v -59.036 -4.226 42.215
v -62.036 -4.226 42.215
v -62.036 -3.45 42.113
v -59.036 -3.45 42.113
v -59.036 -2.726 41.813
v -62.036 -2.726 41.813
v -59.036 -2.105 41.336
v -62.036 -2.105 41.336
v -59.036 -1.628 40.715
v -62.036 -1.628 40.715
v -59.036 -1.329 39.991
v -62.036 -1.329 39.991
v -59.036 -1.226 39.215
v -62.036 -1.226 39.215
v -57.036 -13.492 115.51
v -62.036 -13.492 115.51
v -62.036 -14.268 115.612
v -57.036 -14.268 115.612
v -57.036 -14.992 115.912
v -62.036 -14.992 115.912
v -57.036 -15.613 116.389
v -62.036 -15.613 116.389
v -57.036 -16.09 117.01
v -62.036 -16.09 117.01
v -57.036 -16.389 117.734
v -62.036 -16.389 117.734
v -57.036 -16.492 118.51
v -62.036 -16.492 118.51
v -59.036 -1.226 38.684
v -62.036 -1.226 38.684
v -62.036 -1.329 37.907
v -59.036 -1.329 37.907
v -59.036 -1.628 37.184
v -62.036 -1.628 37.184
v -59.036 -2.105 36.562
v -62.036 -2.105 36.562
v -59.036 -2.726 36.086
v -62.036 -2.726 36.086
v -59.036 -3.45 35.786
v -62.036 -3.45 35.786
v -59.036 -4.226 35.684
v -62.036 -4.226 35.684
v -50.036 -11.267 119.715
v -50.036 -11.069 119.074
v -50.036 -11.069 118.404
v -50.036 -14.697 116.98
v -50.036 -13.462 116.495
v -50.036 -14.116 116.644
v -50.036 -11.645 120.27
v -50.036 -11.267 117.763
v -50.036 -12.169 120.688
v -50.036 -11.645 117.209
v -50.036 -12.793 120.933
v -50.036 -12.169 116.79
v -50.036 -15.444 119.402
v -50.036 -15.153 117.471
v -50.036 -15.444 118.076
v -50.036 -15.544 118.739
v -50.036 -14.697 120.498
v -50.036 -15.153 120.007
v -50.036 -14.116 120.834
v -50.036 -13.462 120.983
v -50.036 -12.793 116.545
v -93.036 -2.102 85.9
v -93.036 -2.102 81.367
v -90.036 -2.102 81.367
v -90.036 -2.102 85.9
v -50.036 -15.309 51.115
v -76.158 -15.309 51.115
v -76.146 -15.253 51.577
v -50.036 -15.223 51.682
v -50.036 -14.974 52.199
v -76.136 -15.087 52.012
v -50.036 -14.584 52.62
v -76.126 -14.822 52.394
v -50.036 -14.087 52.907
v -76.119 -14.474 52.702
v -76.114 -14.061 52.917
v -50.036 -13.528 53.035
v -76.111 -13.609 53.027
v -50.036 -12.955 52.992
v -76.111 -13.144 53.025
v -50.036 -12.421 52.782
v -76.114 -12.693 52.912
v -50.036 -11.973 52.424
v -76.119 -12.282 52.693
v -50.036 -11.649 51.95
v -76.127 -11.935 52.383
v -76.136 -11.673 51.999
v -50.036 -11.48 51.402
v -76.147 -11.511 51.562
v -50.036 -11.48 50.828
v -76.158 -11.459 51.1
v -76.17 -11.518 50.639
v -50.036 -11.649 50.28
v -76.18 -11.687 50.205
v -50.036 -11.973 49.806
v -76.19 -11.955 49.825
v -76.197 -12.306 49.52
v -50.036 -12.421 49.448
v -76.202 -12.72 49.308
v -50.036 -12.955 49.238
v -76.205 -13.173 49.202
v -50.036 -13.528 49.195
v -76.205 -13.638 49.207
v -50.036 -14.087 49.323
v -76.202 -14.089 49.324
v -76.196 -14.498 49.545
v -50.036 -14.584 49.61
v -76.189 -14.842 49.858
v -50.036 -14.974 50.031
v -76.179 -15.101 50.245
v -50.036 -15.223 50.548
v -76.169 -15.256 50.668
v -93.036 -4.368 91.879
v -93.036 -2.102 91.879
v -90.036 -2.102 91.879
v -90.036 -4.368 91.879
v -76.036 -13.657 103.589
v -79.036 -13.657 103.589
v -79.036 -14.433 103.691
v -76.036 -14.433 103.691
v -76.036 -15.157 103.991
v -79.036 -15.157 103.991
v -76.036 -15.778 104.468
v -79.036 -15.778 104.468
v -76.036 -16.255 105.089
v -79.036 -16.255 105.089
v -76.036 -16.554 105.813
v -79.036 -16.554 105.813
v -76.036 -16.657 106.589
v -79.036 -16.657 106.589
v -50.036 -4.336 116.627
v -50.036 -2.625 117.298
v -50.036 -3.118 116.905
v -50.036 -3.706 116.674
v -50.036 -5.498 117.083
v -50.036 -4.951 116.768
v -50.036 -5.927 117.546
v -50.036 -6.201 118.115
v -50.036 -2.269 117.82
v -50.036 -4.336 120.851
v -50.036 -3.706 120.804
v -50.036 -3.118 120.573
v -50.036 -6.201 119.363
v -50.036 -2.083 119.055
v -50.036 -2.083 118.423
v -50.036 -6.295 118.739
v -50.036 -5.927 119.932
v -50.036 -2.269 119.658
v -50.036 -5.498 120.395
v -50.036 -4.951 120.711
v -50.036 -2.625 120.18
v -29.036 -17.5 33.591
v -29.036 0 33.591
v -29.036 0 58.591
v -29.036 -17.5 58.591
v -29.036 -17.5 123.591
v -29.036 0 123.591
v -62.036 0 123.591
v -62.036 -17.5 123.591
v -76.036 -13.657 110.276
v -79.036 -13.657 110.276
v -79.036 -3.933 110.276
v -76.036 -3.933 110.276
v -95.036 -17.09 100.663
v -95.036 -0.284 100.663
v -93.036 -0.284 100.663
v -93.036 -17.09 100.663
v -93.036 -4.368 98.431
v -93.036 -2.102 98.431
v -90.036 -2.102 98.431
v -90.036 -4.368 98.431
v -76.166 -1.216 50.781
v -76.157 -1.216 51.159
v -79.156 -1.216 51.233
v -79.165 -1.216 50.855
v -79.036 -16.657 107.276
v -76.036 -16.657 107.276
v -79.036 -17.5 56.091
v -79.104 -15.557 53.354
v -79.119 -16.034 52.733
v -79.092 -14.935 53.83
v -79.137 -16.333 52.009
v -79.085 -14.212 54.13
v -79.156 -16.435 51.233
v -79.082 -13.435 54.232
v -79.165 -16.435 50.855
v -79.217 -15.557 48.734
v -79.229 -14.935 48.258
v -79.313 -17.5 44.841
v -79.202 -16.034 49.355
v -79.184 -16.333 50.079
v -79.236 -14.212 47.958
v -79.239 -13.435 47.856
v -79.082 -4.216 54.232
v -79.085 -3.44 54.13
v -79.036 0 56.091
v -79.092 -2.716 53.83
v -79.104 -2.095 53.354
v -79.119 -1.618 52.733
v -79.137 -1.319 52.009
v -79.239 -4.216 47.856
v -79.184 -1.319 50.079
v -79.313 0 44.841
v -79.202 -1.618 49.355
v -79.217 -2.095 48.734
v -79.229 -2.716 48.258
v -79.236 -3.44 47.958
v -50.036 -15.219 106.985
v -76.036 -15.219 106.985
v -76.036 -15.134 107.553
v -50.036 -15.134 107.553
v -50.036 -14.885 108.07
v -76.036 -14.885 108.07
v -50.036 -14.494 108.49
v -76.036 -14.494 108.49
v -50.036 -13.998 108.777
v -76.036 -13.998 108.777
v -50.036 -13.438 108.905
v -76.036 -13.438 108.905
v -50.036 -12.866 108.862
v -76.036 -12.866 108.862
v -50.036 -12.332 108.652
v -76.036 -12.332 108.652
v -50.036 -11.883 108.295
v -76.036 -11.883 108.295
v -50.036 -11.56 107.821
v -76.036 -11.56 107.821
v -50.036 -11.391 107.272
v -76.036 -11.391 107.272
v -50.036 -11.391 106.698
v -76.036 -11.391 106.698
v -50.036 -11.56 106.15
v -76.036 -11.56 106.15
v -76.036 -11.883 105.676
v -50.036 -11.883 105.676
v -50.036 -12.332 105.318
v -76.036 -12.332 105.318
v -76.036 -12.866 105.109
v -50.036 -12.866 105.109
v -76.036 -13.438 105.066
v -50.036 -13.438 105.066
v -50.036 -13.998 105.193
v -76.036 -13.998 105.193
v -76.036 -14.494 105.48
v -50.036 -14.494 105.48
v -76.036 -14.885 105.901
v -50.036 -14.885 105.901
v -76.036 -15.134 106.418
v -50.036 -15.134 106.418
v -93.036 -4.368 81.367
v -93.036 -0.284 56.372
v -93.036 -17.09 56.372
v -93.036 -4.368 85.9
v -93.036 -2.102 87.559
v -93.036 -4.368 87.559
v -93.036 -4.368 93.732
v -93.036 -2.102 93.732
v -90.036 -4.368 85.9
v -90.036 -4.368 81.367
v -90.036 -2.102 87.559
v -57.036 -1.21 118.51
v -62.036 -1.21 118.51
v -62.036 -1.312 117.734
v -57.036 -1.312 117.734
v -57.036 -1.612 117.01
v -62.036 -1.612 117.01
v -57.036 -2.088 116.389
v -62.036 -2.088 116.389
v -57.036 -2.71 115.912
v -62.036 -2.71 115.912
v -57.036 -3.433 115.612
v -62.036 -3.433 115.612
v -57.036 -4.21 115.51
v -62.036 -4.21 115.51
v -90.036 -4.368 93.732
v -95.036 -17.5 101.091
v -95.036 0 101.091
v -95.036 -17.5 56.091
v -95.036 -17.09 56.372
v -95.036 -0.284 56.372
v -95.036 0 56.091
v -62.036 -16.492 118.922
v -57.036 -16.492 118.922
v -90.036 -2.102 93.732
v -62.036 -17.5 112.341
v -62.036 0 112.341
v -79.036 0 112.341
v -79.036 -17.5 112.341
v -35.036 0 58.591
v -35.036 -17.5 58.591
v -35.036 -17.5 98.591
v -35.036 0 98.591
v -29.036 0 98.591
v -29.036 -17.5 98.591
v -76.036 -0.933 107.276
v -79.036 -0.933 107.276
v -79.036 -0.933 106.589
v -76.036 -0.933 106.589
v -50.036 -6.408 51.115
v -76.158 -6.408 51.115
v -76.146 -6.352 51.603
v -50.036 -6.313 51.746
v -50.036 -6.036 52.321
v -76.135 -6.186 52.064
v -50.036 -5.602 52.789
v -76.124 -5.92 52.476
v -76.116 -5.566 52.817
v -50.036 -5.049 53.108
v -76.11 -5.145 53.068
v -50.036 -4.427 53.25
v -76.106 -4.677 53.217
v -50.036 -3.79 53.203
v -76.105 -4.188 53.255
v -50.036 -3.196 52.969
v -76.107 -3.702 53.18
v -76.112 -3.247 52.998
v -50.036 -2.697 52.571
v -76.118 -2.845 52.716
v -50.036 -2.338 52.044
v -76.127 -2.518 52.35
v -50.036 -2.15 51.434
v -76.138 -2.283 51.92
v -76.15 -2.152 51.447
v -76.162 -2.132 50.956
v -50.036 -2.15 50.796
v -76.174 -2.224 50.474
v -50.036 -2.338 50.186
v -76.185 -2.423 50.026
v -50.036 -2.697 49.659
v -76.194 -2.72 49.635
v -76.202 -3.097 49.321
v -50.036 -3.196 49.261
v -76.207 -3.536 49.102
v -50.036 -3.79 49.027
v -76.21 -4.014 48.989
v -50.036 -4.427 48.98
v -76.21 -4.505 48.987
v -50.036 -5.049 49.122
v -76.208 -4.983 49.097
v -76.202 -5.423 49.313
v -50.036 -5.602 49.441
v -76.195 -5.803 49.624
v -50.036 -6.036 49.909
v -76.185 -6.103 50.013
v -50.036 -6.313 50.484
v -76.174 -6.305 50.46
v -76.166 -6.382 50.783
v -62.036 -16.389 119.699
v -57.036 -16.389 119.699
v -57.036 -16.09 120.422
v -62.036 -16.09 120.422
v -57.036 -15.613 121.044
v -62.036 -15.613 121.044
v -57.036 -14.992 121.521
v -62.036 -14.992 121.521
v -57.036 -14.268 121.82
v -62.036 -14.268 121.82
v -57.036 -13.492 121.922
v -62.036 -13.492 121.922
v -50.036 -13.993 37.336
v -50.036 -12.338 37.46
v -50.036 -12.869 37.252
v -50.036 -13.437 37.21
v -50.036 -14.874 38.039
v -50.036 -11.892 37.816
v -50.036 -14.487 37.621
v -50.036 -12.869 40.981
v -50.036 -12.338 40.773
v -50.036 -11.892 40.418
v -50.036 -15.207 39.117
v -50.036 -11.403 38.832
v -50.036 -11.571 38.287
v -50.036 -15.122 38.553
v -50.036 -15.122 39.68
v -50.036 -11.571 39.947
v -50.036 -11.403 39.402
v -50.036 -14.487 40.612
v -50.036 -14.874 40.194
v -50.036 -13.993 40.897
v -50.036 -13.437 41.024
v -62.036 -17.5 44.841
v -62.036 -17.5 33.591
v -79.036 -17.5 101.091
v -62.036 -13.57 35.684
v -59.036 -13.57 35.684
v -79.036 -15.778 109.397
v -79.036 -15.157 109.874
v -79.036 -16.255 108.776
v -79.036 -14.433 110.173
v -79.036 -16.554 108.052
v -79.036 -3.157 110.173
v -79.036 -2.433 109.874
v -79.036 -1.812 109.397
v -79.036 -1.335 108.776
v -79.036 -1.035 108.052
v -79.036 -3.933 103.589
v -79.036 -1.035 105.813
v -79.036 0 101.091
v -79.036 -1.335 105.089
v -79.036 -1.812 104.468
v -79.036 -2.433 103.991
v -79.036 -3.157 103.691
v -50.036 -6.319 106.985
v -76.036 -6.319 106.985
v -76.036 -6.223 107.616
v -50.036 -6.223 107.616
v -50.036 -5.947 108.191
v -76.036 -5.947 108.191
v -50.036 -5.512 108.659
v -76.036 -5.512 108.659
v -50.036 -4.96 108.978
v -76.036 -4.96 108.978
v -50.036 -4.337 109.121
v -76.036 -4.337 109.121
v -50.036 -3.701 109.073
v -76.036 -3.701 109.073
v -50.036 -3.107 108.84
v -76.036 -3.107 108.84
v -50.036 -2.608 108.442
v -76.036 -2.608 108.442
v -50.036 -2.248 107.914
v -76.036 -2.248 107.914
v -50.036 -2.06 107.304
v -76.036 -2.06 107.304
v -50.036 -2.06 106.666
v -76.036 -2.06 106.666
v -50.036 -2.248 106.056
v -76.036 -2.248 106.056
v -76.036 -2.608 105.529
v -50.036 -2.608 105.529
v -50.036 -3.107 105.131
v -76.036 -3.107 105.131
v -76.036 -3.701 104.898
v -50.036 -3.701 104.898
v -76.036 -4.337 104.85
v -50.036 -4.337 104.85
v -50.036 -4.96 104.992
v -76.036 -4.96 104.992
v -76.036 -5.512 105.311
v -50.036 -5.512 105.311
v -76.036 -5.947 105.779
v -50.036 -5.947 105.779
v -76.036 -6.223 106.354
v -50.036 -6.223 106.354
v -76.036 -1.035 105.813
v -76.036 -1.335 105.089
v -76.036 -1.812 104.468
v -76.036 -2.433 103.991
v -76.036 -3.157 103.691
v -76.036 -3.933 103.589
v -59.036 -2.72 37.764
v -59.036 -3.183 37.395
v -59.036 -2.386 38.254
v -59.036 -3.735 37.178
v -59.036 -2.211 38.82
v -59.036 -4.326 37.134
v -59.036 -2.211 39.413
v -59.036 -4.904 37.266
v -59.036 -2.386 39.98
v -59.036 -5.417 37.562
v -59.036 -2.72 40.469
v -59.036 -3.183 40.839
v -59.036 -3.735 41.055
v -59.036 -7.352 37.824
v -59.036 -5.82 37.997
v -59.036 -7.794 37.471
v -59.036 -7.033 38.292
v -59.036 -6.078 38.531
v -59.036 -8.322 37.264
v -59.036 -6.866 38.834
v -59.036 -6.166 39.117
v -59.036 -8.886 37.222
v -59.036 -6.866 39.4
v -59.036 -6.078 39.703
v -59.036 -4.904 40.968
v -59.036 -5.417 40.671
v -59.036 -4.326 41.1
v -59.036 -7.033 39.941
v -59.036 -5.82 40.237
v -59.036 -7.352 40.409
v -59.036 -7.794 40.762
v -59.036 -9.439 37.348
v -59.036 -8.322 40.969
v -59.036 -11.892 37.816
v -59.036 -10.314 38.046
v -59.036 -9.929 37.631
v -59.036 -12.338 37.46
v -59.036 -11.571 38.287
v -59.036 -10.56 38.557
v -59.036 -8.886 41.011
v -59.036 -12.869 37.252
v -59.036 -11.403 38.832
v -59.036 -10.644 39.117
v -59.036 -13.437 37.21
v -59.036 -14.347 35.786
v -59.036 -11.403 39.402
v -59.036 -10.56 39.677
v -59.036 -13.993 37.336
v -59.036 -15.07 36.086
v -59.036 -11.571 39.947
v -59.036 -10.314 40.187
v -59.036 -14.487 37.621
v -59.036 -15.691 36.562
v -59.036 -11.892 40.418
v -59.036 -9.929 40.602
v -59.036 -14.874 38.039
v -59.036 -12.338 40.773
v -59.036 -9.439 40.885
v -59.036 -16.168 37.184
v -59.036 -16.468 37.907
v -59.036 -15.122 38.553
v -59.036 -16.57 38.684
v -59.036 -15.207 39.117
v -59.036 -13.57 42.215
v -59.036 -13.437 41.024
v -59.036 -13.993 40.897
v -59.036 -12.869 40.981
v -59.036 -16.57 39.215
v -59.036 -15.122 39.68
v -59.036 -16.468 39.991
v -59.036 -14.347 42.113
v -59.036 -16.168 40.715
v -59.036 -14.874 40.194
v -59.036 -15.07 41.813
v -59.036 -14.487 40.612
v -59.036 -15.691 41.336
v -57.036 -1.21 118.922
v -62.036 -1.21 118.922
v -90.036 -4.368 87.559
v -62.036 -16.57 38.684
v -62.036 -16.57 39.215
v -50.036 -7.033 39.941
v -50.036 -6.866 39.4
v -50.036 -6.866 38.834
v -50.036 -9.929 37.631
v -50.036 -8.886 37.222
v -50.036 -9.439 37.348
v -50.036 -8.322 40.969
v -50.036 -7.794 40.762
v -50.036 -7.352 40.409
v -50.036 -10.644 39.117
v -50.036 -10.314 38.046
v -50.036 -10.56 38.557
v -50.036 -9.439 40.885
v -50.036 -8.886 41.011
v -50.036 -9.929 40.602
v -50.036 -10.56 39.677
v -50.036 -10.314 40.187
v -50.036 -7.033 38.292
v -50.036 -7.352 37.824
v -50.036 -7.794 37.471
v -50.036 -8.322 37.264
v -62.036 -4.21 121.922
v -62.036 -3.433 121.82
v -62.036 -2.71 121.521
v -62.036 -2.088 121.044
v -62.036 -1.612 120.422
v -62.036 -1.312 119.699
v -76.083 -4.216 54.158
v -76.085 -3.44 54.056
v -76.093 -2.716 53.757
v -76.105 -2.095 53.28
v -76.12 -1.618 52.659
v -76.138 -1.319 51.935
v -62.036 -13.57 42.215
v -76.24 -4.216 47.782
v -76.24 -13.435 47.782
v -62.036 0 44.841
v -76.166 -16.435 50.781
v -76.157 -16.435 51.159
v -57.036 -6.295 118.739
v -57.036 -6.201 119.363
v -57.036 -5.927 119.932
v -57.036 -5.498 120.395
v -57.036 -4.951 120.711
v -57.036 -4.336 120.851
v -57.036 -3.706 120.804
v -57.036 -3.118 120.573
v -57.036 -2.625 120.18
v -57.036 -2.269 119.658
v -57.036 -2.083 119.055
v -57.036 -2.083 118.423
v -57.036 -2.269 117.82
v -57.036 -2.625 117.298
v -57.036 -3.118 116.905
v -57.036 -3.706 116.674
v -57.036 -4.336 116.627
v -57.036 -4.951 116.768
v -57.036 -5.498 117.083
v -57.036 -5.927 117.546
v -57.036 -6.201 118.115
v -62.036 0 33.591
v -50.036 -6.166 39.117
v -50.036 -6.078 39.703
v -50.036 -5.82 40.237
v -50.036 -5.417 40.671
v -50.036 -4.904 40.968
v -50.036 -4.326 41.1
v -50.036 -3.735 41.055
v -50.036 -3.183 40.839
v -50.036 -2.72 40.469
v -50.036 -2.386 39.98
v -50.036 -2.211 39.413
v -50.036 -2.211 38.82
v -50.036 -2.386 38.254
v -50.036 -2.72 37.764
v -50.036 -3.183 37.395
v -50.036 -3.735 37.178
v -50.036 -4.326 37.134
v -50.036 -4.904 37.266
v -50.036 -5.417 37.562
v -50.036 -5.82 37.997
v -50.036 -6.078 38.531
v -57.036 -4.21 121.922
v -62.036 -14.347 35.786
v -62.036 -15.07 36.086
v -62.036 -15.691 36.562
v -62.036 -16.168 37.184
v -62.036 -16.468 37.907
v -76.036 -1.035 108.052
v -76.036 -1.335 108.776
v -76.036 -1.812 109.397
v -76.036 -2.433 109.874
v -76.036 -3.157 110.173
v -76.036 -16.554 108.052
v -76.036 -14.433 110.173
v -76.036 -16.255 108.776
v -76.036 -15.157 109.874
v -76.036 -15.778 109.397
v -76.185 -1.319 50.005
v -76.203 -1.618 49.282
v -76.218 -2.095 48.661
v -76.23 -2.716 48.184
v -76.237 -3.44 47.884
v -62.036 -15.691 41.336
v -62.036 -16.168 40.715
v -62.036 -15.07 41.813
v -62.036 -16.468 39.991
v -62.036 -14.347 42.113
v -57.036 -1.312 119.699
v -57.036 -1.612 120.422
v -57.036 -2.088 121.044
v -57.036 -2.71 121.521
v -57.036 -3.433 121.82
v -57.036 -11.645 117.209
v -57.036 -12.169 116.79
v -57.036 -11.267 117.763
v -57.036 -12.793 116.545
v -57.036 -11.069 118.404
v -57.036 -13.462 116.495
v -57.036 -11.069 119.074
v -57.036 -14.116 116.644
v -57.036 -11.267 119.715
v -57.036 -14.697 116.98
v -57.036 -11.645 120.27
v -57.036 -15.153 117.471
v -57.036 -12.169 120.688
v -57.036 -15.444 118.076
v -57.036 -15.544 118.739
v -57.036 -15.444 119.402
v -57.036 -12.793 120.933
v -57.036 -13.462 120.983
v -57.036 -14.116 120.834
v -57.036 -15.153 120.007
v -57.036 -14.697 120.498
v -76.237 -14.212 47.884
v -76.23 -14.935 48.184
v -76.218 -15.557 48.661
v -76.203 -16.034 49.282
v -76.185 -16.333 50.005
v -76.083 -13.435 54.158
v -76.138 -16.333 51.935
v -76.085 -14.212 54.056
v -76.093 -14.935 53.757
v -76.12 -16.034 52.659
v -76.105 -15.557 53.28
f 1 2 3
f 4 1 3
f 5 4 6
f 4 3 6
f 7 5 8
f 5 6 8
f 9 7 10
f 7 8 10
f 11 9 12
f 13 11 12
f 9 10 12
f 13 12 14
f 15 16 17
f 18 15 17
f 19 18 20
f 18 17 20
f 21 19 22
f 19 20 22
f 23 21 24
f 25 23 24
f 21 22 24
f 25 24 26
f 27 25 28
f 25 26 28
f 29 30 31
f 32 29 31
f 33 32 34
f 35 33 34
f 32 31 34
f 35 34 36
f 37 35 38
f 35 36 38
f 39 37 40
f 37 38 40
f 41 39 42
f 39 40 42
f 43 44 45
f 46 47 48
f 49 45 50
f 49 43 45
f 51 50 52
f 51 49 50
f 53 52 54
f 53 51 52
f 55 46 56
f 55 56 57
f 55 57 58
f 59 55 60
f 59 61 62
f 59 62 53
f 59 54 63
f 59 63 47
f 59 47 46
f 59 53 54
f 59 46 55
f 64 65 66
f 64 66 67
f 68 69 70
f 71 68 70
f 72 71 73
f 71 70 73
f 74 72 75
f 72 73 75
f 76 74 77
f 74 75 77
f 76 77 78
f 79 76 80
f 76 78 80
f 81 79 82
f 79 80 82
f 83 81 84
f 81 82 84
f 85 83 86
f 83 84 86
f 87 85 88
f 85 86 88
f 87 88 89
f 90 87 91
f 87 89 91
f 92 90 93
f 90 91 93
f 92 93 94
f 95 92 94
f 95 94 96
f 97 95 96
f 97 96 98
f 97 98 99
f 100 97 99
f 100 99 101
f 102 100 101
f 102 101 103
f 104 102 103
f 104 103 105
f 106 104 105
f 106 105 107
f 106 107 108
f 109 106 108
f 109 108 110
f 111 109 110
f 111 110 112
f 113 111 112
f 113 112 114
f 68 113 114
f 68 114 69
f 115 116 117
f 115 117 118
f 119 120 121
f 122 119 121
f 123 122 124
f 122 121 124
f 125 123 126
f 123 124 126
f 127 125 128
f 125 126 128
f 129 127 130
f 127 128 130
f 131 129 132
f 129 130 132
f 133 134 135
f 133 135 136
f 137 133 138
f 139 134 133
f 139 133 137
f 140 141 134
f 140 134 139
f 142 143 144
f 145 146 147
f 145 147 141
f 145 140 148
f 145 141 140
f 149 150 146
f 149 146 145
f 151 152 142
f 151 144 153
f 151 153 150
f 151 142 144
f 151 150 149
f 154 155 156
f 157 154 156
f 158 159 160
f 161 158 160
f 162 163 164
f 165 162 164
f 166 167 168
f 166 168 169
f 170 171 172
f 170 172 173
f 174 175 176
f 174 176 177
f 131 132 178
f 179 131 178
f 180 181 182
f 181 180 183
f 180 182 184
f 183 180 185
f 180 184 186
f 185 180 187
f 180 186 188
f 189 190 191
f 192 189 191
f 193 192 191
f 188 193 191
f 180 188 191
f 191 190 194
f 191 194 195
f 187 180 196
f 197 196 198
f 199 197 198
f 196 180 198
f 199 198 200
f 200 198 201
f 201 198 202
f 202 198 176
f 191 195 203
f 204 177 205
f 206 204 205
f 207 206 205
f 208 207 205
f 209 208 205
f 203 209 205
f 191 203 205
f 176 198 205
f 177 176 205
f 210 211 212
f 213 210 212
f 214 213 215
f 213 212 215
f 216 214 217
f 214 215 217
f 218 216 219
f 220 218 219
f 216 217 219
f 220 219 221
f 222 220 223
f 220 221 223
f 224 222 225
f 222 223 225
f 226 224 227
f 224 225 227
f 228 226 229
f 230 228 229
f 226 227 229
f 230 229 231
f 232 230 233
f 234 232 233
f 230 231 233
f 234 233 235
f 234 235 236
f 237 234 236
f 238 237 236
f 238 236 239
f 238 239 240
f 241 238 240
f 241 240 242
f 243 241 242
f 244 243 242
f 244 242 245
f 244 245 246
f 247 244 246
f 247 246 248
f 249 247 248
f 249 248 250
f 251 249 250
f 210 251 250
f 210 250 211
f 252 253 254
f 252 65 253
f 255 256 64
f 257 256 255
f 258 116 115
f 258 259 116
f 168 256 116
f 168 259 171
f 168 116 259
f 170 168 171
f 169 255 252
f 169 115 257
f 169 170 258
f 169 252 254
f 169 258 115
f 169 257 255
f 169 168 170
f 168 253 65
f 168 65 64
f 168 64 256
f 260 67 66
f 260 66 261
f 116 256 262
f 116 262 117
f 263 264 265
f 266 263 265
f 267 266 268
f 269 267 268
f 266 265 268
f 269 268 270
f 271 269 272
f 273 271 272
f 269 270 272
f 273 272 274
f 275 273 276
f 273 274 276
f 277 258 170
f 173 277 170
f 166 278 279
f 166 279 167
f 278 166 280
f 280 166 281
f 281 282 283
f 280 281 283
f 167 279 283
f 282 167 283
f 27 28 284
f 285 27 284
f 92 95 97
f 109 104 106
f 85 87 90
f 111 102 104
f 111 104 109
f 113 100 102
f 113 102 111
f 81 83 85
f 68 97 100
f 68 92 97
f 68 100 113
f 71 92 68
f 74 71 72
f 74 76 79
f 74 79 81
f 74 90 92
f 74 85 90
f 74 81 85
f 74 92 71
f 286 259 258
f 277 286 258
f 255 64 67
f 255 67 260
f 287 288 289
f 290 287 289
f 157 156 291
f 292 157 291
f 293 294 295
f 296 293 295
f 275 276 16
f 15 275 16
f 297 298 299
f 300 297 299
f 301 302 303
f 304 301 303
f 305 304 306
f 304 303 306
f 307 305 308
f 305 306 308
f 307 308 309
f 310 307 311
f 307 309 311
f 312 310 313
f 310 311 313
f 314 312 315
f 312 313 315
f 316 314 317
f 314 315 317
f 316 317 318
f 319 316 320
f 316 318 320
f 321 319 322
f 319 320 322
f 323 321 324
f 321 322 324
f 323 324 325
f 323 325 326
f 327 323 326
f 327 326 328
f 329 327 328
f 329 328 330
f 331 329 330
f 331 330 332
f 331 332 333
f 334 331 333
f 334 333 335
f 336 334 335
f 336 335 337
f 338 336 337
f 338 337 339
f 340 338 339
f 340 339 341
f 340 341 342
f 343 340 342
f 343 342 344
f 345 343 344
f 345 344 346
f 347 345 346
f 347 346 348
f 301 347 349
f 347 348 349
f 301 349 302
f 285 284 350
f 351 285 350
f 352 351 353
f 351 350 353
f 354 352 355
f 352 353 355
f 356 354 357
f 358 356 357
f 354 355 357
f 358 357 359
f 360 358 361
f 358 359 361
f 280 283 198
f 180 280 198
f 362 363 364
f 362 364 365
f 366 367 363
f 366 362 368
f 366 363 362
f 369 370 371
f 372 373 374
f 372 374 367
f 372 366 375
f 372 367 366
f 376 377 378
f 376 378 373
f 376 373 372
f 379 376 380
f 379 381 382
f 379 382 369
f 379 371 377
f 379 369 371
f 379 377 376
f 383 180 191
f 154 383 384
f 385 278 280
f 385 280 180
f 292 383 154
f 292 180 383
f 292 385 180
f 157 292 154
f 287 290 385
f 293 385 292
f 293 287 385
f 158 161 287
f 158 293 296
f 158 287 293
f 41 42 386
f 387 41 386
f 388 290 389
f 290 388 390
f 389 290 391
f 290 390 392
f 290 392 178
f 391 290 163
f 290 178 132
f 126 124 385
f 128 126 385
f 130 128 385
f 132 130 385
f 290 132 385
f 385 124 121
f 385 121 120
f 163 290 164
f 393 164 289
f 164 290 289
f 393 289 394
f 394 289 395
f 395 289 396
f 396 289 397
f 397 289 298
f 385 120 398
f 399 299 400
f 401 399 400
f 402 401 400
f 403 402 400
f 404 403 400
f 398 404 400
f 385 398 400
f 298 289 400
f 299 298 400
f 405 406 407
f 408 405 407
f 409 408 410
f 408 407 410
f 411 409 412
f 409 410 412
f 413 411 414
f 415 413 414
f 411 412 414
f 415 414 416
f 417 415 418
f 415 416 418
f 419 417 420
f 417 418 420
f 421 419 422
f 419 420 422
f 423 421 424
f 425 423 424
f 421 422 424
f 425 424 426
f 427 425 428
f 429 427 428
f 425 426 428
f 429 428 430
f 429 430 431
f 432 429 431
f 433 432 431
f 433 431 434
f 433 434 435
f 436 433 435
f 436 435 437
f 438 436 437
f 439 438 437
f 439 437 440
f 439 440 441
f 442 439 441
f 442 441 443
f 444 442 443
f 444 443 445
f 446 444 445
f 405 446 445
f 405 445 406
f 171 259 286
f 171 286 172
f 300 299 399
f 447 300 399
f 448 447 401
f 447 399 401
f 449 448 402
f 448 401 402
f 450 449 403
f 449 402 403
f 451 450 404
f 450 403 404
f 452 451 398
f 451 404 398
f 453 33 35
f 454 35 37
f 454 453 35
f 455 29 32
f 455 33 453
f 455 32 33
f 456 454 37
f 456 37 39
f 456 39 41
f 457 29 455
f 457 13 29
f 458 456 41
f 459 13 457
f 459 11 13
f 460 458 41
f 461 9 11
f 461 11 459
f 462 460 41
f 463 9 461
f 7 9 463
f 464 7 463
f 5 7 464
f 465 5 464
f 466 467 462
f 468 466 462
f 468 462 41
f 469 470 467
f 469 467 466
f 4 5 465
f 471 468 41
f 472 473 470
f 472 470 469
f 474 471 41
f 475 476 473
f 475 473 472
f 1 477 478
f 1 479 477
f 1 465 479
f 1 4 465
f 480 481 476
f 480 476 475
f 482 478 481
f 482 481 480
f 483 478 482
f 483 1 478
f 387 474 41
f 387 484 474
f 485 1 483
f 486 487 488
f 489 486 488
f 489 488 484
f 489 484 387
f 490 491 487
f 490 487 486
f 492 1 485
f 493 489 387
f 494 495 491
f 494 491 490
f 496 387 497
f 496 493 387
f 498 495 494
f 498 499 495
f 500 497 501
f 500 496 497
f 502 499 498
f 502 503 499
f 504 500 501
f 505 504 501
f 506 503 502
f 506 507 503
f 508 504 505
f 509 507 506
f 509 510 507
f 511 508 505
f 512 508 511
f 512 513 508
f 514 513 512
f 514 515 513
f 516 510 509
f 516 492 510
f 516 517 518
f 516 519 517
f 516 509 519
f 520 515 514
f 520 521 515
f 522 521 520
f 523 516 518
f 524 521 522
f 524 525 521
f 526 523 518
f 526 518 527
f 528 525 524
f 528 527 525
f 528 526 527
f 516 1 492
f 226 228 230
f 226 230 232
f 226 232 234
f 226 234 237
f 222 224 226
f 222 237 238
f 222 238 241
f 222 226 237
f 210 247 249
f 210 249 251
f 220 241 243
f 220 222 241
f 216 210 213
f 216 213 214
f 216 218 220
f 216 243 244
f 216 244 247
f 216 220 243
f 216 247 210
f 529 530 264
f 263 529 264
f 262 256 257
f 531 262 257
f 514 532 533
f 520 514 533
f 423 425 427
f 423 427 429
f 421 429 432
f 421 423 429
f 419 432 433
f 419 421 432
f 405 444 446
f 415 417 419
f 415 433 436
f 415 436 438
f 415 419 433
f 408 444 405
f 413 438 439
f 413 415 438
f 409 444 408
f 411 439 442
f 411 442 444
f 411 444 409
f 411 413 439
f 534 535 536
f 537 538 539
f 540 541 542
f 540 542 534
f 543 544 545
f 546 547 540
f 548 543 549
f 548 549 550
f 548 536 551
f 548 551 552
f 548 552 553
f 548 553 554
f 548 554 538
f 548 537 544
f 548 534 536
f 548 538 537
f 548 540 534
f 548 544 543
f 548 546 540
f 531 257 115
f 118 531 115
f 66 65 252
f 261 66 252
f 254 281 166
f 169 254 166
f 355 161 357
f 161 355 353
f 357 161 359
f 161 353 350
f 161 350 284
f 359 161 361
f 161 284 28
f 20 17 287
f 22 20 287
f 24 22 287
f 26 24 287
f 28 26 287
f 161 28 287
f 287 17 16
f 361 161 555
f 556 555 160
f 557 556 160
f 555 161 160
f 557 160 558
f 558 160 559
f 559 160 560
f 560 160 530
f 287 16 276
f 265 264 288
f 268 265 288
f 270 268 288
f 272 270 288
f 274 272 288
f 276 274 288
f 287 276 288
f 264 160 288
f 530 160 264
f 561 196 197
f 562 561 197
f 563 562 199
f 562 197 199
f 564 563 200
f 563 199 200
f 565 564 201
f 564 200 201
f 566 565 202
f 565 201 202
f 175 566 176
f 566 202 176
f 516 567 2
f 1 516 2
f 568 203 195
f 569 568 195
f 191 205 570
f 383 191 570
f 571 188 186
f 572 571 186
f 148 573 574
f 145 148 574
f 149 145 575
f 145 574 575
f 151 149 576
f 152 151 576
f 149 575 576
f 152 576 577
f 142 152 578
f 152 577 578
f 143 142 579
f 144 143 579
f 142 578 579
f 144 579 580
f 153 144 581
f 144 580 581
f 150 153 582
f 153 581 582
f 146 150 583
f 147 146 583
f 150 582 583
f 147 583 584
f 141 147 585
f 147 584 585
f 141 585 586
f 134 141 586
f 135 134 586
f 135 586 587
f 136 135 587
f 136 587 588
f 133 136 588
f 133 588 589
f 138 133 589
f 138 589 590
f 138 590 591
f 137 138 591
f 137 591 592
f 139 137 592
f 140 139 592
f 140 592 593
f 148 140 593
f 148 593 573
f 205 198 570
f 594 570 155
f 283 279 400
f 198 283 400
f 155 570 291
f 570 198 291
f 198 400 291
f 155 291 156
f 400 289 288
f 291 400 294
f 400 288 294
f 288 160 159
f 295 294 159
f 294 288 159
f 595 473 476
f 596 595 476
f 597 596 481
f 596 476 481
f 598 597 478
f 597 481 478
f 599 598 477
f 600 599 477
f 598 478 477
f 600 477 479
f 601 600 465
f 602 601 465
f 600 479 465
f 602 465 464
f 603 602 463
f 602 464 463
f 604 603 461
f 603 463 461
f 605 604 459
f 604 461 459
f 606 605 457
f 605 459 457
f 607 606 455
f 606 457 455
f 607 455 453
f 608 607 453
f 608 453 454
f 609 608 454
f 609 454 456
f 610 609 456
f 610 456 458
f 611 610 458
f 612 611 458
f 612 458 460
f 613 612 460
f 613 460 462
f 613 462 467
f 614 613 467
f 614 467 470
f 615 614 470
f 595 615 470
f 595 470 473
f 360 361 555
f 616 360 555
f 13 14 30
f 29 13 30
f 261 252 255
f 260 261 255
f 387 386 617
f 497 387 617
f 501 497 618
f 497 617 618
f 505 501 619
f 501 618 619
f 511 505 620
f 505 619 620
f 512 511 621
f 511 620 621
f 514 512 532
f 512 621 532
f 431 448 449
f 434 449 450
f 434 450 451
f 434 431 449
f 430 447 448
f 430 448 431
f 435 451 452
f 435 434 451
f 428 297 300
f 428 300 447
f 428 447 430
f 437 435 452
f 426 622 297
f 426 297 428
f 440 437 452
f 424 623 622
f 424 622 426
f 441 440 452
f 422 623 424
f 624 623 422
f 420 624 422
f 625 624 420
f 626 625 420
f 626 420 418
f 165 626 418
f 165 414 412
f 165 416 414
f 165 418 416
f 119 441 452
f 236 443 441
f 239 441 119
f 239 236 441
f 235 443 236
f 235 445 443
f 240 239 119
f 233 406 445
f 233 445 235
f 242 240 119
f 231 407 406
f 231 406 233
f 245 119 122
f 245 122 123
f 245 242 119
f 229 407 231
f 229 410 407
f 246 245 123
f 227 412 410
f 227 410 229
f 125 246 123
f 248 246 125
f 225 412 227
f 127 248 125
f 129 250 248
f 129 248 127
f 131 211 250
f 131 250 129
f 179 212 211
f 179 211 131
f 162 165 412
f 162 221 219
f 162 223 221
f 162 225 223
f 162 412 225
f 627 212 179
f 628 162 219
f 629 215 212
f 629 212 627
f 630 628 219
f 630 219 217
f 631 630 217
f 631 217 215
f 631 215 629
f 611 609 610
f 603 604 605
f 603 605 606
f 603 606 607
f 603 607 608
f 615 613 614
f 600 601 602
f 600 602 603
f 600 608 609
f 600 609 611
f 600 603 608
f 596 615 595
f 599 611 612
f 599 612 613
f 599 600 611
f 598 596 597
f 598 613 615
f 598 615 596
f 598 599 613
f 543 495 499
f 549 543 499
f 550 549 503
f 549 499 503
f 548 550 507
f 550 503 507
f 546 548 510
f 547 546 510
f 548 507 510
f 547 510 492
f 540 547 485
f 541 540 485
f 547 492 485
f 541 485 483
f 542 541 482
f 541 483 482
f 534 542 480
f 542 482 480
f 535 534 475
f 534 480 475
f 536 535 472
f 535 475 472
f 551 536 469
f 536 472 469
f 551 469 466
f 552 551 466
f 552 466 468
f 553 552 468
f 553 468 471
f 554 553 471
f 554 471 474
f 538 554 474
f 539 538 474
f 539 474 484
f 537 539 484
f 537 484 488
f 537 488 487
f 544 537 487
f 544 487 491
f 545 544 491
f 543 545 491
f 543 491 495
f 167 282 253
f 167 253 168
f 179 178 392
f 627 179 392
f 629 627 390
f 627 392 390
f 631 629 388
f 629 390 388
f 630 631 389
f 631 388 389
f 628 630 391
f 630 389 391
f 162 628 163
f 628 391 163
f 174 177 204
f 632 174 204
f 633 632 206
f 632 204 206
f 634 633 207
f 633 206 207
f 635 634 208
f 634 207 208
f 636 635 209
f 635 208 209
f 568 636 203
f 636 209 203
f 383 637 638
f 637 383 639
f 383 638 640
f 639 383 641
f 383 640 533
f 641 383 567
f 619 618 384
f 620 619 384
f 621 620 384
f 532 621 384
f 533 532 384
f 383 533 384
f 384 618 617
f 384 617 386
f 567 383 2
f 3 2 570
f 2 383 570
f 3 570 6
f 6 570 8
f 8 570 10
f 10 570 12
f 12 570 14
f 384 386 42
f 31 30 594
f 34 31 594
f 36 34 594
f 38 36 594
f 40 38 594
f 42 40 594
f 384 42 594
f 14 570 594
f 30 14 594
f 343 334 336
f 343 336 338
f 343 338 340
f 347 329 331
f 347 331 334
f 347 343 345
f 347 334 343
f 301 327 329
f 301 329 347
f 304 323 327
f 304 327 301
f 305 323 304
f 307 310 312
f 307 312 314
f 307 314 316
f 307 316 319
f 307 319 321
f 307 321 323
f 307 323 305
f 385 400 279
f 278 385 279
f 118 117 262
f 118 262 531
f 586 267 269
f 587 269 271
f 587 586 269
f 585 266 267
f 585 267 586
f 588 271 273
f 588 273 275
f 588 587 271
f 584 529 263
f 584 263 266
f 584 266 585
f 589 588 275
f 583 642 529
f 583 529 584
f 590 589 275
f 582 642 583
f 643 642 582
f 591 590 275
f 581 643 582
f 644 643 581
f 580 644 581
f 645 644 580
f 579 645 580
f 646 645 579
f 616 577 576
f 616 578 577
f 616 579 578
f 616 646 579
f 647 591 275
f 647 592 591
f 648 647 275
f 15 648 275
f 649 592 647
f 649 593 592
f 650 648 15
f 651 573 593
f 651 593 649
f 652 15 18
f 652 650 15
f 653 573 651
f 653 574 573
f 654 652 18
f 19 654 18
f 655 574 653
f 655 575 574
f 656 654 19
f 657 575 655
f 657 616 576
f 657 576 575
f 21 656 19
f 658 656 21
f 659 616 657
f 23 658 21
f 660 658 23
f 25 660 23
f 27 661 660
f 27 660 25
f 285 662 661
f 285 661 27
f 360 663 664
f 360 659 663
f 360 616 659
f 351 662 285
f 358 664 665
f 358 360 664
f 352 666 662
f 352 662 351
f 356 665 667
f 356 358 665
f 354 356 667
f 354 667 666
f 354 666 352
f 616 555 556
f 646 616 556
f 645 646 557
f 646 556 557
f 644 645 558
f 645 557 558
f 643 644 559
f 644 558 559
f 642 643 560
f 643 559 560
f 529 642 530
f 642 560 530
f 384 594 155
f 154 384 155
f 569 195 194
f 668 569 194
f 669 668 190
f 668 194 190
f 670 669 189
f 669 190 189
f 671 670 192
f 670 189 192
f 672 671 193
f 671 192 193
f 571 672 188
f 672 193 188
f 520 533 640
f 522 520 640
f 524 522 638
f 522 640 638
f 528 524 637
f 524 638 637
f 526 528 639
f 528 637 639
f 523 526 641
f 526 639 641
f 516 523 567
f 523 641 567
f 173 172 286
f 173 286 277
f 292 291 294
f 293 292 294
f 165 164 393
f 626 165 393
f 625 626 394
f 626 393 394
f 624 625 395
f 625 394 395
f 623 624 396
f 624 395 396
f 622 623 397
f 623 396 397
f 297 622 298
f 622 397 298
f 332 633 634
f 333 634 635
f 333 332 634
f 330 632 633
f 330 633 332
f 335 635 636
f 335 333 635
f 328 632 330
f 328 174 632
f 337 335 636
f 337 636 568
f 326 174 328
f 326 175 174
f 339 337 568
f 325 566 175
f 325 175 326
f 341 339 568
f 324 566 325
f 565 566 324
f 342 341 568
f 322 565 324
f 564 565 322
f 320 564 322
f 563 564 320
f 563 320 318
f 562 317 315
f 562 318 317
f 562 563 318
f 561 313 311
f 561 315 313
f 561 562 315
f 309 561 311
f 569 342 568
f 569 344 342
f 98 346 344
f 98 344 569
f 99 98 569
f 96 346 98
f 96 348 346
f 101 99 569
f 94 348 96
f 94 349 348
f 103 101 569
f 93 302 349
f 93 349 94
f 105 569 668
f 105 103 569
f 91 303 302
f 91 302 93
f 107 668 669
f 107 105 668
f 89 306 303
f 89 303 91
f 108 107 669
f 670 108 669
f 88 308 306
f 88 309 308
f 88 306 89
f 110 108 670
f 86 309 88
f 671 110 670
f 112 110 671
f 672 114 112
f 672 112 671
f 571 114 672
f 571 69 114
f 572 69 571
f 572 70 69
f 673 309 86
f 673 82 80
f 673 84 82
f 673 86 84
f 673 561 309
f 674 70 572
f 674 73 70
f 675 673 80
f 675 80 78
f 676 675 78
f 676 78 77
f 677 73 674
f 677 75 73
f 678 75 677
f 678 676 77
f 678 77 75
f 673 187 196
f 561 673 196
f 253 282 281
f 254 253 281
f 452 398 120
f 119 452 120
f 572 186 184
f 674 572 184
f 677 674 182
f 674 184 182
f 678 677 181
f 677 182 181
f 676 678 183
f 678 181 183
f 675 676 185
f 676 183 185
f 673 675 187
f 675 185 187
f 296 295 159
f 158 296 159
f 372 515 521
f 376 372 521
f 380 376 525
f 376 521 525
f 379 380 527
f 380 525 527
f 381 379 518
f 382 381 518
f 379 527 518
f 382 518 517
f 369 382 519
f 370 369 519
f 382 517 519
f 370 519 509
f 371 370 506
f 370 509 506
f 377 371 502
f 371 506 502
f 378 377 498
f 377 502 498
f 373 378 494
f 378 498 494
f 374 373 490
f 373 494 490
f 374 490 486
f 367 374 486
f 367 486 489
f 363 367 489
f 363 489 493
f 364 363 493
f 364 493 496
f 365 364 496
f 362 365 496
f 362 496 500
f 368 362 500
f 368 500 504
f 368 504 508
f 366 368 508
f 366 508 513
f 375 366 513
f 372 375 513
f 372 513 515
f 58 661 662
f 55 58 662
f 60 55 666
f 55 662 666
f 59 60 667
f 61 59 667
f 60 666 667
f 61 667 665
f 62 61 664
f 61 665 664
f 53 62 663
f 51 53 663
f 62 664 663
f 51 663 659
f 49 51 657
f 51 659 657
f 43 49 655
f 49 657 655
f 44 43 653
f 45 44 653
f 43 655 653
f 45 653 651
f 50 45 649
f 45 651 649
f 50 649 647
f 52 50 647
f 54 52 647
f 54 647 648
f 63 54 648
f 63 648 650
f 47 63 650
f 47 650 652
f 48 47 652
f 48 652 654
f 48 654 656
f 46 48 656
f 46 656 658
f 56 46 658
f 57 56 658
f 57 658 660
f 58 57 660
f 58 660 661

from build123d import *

# Parameters (mm, degrees)
F1_DEPTH  = 17.5
F4_DEPTH  = 5
F6_DEPTH  = 3
F8_DEPTH  = 3
F9_W      = 16.8058317795
F9_H      = 44.2914962769
F10_DEPTH = 2
F2_R      = 2.117891982
F2_R_2    = 2.2502095604
F2_R_3    = 2.1412189154
F2_R_4    = 1.9250274961
F2_R_5    = 1.9886102938
F2_R_6    = 1.8999785502
F2_R_7    = 1.9125474789
F11_DEPTH = 45
F13_DEPTH = 3
F14_W     = 2.2663704585
F14_H     = 4.6991482377
F14_H_2   = 4.3204948306
F14_H_3   = 4.5327991247
F15_DEPTH = 3


with BuildPart() as f1:
    # F0 (on Front) → F1 (new body)
    with BuildSketch(Plane.XZ):
        Polygon((-29.036315158, 123.5913918912), (-62.036315158, 123.5913918912), (-62.036315158, 112.3413918912), (-79.036315158, 112.3413918912), (-79.036315158, 101.0913918912), (-95.036315158, 101.0913918912), (-95.036315158, 56.0913918912), (-79.036315158, 56.0913918912), (-79.3131489307, 44.8413918912), (-62.036315158, 44.8413918912), (-62.036315158, 33.5913918912), (-29.036315158, 33.5913918912), (-29.036315158, 58.5913918912), (-35.036315158, 58.5913918912), (-35.036315158, 98.5913918912), (-29.036315158, 98.5913918912), align=None)
    extrude(amount=F1_DEPTH)

    # F3 (on face) → F4 (cut)
    with BuildSketch(Plane(origin=(-62.036315158, 0, 0), x_dir=(0, -1, 0), z_dir=(-1, 0, 0))):
        with BuildLine():
            Line((13.4917167276, 121.9224523306), (4.209778944, 121.9224523306))
            ThreePointArc((4.209778944, 121.9224523306), (2.0884586005, 121.0437726741), (1.209778944, 118.9224523306))
            Line((1.209778944, 118.9224523306), (1.209778944, 118.5100823641))
            ThreePointArc((1.209778944, 118.5100823641), (2.0884586005, 116.3887620205), (4.209778944, 115.5100823641))
            Line((4.209778944, 115.5100823641), (13.4917167276, 115.5100823641))
            ThreePointArc((13.4917167276, 115.5100823641), (15.6130370712, 116.3887620205), (16.4917167276, 118.5100823641))
            Line((16.4917167276, 118.5100823641), (16.4917167276, 118.9224523306))
            ThreePointArc((16.4917167276, 118.9224523306), (15.6130370712, 121.0437726741), (13.4917167276, 121.9224523306))
        make_face()
    extrude(amount=-F4_DEPTH, mode=Mode.SUBTRACT)

    # F5 (on face) → F6 (cut)
    with BuildSketch(Plane(origin=(-79.036315158, 0, 0), x_dir=(0, -1, 0), z_dir=(-1, 0, 0))):
        with BuildLine():
            Line((13.656557098, 110.2756986618), (3.9331587353, 110.2756986618))
            ThreePointArc((3.9331587353, 110.2756986618), (1.8118383917, 109.3970190054), (0.9331587353, 107.2756986618))
            Line((0.9331587353, 107.2756986618), (0.9331587353, 106.5890877247))
            ThreePointArc((0.9331587353, 106.5890877247), (1.8118383917, 104.4677673811), (3.9331587353, 103.5890877247))
            Line((3.9331587353, 103.5890877247), (13.656557098, 103.5890877247))
            ThreePointArc((13.656557098, 103.5890877247), (15.7778774416, 104.4677673811), (16.656557098, 106.5890877247))
            Line((16.656557098, 106.5890877247), (16.656557098, 107.2756986618))
            ThreePointArc((16.656557098, 107.2756986618), (15.7778774416, 109.3970190054), (13.656557098, 110.2756986618))
        make_face()
    extrude(amount=-F6_DEPTH, mode=Mode.SUBTRACT)

    # F7 (on face) → F8 (cut)
    with BuildSketch(Plane(origin=(-62.036315158, 0, 0), x_dir=(0, -1, 0), z_dir=(-1, 0, 0))):
        with BuildLine():
            ThreePointArc((1.2264838442, 38.6837883592), (2.1051635007, 36.5624680156), (4.2264838442, 35.6837883592))
            Line((4.2264838442, 35.6837883592), (13.5701508522, 35.6837883592))
            ThreePointArc((13.5701508522, 35.6837883592), (15.6914711958, 36.5624680156), (16.5701508522, 38.6837883592))
            Line((16.5701508522, 38.6837883592), (16.5701508522, 39.2147824168))
            ThreePointArc((16.5701508522, 39.2147824168), (15.6914711958, 41.3361027604), (13.5701508522, 42.2147824168))
            Line((13.5701508522, 42.2147824168), (4.2264838442, 42.2147824168))
            ThreePointArc((4.2264838442, 42.2147824168), (2.1051635007, 41.3361027604), (1.2264838442, 39.2147824168))
            Line((1.2264838442, 39.2147824168), (1.2264838442, 38.6837883592))
        make_face()
    extrude(amount=-F8_DEPTH, mode=Mode.SUBTRACT)

    # F9 (on face) → F10 (cut)
    with BuildSketch(Plane(origin=(-95.036315158, 0, 0), x_dir=(0, -1, 0), z_dir=(-1, 0, 0))):
        with Locations((8.6868142389, 78.5176903009)):
            Rectangle(F9_W, F9_H)
    extrude(amount=-F10_DEPTH, mode=Mode.SUBTRACT)

    # F2 (on face) → F11 (cut)
    with BuildSketch(Plane(origin=(-95.036315158, 0, 0), x_dir=(0, -1, 0), z_dir=(-1, 0, 0))):
        with Locations((4.1773817502, 118.7390312552)):
            Circle(F2_R)
        with Locations((13.2942087948, 118.7390312552)):
            Circle(F2_R_2)
        with Locations((4.1773817502, 106.985270977)):
            Circle(F2_R_3)
        with Locations((13.2942087948, 106.985270977)):
            Circle(F2_R_4)
        with Locations((4.2668927927, 51.1149987578)):
            Circle(F2_R_3)
        with Locations((13.3837198373, 51.1149987578)):
            Circle(F2_R_4)
        with Locations((4.1773817502, 39.1167402267)):
            Circle(F2_R_5)
        with Locations((8.744363673, 39.1167402267)):
            Circle(F2_R_6)
        with Locations((13.2942087948, 39.1167402267)):
            Circle(F2_R_7)
    extrude(amount=-F11_DEPTH, mode=Mode.SUBTRACT)

    # F12 (on face) → F13 (cut)
    with BuildSketch(Plane(origin=(-80.3679161841, 0, 1.9776491945), x_dir=(0, -1, 0), z_dir=(-0.9996973742, 0, 0.0245999996))):
        with BuildLine():
            ThreePointArc((16.4354741573, 49.2703006864), (15.5567945009, 51.3916210299), (13.4354741573, 52.2703006864))
            Line((13.4354741573, 52.2703006864), (4.2163297506, 52.2703006864))
            ThreePointArc((4.2163297506, 52.2703006864), (2.095009407, 51.3916210299), (1.2163297506, 49.2703006864))
            Line((1.2163297506, 49.2703006864), (1.2163297506, 48.8921268582))
            ThreePointArc((1.2163297506, 48.8921268582), (2.095009407, 46.7708065147), (4.2163297506, 45.8921268582))
            Line((4.2163297506, 45.8921268582), (13.4354741573, 45.8921268582))
            ThreePointArc((13.4354741573, 45.8921268582), (15.5567945009, 46.7708065147), (16.4354741573, 48.8921268582))
            Line((16.4354741573, 48.8921268582), (16.4354741573, 49.2703006864))
        make_face()
    extrude(amount=-F13_DEPTH, mode=Mode.SUBTRACT)

    # F14 (on face) → F15 (cut)
    with BuildSketch(Plane(origin=(-93.036315158, 0, 0), x_dir=(0, -1, 0), z_dir=(-1, 0, 0))):
        with Locations((3.2347693341, 96.0811041296)):
            Rectangle(F14_W, F14_H)
        with Locations((3.2347693341, 89.7187851369)):
            Rectangle(F14_W, F14_H_2)
        with Locations((3.2347693341, 83.6331695318)):
            Rectangle(F14_W, F14_H_3)
    extrude(amount=-F15_DEPTH, mode=Mode.SUBTRACT)


solid = f1.part
